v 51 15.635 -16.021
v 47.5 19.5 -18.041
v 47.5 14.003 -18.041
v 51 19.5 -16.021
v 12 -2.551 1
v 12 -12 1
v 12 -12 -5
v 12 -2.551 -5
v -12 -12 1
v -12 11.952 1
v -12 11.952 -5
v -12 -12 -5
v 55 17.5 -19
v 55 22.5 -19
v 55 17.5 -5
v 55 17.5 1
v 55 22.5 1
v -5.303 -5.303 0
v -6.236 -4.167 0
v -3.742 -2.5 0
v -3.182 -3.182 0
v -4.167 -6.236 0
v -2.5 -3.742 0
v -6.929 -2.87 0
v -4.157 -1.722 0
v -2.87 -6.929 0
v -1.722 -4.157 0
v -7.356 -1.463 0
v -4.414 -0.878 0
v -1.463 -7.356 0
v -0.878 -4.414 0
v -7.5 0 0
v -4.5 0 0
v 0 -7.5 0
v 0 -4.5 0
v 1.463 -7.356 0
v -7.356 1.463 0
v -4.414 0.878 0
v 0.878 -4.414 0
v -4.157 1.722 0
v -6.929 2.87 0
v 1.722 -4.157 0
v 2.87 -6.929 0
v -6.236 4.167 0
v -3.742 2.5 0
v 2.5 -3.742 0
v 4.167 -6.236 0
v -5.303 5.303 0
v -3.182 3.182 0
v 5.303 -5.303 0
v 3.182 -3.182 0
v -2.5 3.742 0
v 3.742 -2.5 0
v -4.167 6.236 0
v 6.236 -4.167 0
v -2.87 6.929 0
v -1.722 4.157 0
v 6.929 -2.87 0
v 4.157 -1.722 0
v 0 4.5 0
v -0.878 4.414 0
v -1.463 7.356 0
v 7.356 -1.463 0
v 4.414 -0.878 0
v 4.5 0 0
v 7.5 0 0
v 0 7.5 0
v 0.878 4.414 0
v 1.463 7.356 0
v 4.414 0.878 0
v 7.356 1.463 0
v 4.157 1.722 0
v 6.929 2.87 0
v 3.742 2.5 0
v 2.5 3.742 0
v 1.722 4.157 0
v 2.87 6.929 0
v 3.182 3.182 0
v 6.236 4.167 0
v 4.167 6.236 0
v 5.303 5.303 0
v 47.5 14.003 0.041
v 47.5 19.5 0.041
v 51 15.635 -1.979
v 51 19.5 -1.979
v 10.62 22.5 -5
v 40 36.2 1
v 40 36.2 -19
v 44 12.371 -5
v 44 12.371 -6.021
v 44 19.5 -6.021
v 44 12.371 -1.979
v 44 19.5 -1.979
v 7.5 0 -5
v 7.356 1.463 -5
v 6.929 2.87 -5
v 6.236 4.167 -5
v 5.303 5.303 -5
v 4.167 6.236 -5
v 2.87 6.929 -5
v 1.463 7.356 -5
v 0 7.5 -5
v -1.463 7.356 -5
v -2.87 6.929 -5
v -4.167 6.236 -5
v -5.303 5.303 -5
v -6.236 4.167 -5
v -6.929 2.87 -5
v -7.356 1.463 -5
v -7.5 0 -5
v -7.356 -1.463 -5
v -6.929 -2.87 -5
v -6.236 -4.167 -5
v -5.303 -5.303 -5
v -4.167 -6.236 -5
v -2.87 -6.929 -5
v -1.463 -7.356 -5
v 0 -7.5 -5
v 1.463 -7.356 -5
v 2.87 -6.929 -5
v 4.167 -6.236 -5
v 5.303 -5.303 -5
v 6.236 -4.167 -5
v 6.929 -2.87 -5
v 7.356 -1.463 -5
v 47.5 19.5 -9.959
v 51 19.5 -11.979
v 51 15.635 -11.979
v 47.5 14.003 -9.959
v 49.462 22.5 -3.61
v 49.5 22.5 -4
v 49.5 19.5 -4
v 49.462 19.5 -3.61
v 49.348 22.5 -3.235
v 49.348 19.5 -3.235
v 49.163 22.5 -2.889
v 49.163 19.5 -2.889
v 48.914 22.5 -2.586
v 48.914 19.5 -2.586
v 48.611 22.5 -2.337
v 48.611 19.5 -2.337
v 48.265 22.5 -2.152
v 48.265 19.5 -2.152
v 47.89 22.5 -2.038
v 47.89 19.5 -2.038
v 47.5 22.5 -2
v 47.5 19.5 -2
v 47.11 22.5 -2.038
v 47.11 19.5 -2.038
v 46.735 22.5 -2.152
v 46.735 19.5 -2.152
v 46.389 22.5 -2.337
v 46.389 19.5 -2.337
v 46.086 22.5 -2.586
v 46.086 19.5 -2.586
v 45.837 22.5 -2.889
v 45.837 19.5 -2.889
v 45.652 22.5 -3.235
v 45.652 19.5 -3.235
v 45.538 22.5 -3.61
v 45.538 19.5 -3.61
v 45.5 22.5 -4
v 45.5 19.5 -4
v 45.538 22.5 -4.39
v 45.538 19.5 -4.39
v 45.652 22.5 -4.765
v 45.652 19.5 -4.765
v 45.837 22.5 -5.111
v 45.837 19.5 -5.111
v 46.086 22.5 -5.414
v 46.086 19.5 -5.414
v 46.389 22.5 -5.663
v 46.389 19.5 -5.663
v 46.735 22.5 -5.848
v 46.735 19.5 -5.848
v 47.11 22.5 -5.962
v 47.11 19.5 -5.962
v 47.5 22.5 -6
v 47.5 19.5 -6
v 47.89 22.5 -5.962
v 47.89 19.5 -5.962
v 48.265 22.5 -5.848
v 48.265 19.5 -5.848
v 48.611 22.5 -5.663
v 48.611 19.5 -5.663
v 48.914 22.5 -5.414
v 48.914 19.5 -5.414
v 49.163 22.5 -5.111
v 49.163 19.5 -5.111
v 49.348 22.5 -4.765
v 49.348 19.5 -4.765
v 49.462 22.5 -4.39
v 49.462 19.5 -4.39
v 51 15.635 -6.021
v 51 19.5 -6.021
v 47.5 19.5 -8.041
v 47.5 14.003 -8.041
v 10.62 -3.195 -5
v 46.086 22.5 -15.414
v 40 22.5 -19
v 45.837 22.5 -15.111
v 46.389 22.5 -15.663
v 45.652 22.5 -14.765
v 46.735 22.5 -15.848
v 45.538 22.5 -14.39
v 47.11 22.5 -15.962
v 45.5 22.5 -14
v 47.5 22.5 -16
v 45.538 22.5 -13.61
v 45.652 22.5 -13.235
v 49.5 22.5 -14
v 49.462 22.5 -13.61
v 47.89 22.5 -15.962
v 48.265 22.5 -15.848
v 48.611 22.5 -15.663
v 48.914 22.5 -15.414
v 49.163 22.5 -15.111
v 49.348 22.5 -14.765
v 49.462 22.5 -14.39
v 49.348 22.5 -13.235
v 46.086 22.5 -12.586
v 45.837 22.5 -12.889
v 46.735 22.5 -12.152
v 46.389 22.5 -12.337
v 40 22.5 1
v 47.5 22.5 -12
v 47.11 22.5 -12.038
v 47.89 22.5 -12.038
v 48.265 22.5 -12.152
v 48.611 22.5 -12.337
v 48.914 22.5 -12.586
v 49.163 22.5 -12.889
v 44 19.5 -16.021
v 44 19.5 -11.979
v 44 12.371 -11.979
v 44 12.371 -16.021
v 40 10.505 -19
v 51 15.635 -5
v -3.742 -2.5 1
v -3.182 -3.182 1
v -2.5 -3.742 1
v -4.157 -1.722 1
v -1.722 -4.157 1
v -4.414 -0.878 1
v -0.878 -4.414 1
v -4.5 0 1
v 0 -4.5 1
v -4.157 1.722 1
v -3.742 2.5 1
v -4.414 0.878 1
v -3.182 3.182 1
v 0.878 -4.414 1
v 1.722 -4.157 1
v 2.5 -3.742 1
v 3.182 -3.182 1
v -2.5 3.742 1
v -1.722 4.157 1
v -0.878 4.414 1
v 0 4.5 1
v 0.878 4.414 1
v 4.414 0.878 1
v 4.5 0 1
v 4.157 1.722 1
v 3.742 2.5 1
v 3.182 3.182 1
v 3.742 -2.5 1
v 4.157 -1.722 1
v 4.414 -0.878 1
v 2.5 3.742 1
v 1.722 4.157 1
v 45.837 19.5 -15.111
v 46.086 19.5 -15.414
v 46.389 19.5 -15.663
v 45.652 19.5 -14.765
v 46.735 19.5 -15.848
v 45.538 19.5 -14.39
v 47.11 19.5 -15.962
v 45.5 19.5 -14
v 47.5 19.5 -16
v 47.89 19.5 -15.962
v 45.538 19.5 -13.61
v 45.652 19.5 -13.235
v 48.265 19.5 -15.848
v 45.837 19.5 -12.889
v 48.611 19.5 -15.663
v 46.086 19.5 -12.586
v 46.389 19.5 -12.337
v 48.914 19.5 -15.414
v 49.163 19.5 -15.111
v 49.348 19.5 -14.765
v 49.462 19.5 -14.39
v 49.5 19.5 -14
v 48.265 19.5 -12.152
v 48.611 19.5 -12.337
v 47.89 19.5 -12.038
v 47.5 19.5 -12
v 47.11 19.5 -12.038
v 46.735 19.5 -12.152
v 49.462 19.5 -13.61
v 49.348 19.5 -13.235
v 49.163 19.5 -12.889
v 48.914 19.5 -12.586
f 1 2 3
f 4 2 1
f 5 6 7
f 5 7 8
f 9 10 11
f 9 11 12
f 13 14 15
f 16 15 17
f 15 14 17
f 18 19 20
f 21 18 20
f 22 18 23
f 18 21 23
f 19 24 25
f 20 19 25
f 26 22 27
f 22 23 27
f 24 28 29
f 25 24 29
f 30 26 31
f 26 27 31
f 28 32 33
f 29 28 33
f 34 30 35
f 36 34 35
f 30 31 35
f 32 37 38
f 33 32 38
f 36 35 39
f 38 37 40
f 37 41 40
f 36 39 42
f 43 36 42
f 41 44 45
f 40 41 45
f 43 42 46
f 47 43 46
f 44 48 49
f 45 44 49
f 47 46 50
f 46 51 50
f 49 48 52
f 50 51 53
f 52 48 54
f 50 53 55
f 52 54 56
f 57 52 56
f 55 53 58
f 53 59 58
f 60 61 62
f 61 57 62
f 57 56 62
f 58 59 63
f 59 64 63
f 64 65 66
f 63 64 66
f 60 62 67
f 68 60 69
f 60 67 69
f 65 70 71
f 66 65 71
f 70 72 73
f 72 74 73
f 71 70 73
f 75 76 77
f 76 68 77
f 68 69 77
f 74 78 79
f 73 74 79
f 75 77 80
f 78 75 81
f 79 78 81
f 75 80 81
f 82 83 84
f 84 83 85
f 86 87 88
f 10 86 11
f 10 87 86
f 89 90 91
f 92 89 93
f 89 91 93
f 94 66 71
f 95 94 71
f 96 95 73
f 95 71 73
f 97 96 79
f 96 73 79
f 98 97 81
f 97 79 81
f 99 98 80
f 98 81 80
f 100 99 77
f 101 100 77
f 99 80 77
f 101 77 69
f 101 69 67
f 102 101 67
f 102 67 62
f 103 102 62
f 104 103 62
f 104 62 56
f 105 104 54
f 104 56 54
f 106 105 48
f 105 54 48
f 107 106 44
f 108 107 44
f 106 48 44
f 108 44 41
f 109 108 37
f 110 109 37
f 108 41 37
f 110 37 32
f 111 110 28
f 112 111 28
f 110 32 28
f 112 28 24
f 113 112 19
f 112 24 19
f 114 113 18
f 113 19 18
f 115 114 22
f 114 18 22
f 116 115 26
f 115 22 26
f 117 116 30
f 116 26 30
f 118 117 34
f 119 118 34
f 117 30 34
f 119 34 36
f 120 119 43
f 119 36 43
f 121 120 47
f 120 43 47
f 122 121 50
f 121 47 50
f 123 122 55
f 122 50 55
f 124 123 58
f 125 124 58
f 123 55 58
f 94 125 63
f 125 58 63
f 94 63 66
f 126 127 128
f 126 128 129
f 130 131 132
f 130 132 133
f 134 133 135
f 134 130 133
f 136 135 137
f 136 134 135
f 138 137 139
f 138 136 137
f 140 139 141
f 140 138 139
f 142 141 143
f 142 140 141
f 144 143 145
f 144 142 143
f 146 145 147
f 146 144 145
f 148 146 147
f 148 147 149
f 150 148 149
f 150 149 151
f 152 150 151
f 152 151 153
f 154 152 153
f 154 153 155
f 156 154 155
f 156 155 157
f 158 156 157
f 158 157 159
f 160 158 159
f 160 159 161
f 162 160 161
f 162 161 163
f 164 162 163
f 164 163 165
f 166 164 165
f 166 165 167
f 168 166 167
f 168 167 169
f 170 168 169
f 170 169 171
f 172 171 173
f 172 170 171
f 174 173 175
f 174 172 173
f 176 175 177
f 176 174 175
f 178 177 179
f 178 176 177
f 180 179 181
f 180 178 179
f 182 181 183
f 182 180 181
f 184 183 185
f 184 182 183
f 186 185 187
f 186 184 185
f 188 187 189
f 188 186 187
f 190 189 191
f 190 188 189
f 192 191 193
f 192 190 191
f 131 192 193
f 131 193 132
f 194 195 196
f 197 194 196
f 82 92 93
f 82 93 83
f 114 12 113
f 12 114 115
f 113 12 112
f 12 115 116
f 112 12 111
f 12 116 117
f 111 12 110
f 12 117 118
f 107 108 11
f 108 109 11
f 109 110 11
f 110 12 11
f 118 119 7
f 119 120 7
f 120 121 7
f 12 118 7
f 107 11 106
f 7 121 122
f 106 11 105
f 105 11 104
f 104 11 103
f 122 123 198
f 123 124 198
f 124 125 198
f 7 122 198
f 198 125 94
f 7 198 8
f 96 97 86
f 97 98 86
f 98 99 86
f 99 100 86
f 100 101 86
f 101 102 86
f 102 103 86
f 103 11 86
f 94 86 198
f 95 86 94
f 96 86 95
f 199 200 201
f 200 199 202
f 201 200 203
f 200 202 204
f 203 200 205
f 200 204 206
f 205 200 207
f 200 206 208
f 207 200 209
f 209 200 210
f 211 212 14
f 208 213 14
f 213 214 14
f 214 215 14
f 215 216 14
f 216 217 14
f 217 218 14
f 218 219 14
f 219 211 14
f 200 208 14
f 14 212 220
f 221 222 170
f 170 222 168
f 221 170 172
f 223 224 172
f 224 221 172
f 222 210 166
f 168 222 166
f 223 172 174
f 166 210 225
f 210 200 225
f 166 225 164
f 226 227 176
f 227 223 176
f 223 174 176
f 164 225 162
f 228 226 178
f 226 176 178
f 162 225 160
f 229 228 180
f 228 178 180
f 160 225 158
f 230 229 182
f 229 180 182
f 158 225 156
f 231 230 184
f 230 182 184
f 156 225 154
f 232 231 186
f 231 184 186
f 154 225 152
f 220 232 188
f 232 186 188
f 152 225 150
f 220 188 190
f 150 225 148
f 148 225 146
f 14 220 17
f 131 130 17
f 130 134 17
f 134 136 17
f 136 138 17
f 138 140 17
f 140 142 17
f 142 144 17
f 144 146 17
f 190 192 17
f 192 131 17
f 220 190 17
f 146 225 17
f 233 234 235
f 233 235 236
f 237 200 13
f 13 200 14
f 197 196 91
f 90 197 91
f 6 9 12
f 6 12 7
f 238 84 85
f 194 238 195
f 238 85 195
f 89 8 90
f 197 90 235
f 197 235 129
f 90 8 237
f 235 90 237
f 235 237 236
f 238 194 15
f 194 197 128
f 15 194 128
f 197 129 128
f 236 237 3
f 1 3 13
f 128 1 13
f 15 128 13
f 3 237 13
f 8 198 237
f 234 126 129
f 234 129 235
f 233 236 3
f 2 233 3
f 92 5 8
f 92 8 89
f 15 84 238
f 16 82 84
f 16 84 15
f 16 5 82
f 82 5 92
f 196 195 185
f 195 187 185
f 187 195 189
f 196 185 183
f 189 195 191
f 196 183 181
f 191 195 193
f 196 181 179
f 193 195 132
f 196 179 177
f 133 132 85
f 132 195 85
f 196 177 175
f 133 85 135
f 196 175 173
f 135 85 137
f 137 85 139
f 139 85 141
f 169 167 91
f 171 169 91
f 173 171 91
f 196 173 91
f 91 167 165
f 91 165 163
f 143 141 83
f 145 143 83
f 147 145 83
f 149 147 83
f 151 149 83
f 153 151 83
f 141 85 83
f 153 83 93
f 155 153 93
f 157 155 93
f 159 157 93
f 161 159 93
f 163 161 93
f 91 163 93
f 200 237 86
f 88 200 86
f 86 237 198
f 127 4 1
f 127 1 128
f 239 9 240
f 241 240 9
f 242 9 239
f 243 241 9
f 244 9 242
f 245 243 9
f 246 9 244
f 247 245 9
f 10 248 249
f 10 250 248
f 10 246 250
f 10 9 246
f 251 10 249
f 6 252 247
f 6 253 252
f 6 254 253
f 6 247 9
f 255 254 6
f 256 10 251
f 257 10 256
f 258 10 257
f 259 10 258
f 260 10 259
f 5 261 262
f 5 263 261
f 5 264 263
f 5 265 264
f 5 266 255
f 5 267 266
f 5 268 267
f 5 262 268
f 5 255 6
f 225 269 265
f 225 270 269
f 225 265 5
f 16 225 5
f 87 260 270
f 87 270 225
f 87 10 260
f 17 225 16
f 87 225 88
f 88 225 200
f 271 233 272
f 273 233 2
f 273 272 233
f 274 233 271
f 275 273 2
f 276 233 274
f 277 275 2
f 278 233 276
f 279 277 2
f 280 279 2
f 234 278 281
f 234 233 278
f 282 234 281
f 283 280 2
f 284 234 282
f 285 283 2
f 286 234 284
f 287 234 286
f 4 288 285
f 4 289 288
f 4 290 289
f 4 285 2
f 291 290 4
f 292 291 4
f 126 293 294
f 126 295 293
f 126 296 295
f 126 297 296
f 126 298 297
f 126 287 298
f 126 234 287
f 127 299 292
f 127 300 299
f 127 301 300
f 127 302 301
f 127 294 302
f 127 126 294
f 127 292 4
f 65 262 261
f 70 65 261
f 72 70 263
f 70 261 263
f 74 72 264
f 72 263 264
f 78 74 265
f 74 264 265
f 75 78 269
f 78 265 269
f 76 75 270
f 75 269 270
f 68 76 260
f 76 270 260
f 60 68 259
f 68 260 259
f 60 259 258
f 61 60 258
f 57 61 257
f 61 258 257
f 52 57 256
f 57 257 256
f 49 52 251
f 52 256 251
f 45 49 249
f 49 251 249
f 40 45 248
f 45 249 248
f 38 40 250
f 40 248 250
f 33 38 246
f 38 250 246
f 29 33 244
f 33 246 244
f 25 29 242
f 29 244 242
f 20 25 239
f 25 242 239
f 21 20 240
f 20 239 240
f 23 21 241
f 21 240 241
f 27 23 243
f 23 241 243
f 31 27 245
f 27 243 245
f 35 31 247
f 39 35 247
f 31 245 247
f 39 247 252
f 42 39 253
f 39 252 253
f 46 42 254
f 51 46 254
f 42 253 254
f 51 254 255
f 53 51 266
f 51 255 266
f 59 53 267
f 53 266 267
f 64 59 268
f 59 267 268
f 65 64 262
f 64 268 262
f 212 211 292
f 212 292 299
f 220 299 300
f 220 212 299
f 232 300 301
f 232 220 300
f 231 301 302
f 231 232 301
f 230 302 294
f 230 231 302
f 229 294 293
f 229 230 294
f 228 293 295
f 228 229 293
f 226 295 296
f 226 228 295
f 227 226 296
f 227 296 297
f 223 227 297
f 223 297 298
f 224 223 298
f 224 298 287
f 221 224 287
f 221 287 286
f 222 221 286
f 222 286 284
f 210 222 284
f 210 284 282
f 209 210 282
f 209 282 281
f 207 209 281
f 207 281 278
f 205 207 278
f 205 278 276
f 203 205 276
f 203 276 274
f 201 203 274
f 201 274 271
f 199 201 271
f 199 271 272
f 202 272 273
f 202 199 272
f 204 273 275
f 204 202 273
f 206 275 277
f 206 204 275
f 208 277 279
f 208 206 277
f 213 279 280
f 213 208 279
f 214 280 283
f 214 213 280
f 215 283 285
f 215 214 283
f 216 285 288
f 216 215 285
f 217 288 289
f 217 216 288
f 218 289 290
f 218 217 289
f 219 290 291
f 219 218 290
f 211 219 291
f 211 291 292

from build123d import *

# Parameters (mm, degrees)
SKETCH1_R           = 10
SKETCH1_R_2         = 7.5
BOSS_EXTRUDE1_DEPTH = 5
BOSS_EXTRUDE2_START = 1
SKETCH1_3_R         = 10
SKETCH1_3_R_2       = 7.5
SKETCH1_3_R_3       = 4.5
BOSS_EXTRUDE2_DEPTH = 1
SKETCH2_R           = 10
BOSS_EXTRUDE3_DEPTH = 6
BOSS_EXTRUDE7_REACH = 67.117
SKETCH3_W           = 15
SKETCH3_H           = 14
SKETCH4_R           = 2
CUT_EXTRUDE4_DEPTH  = 68.647985927
CUT_EXTRUDE5_START  = 3
SKETCH4_3_R         = 2
CUT_EXTRUDE5_DEPTH  = 65.647985927
BOSS_EXTRUDE8_REACH = 69.648


with BuildPart() as part:
    # Sketch1 → Boss-Extrude1 (new body)
    with BuildSketch(Plane.XY):
        Circle(SKETCH1_R)
        Circle(SKETCH1_R_2, mode=Mode.SUBTRACT)
    extrude(amount=-BOSS_EXTRUDE1_DEPTH)

    # Sketch1<3> → Boss-Extrude2 (add)
    # profile 1 of 2: a face of its own
    with BuildSketch(Plane.XY.offset(BOSS_EXTRUDE2_START)):
        Circle(SKETCH1_3_R)
        Circle(SKETCH1_3_R_2, mode=Mode.SUBTRACT)
    # profile 2 of 2: a face of its own
    with BuildSketch(Plane.XY.offset(BOSS_EXTRUDE2_START)):
        Circle(SKETCH1_3_R_2)
        Circle(SKETCH1_3_R_3, mode=Mode.SUBTRACT)
    extrude(amount=-BOSS_EXTRUDE2_DEPTH)

    # Sketch2 → Boss-Extrude3 (add)
    with BuildSketch(Plane.XY.offset(1)):
        Polygon((55, 17.5), (55, 22.5), (40, 22.5), (40, 36.2), (-12, 11.952001776), (-12, -12), (12, -12), (12, -2.551229301), align=None)
        Circle(SKETCH2_R, mode=Mode.SUBTRACT)
    extrude(amount=-BOSS_EXTRUDE3_DEPTH)

    # Boss-Extrude7: up to this plane
    boss_extrude7_end = Plane(origin=(3.120451856, -6.691830601, -87.536295046), z_dir=(-0.422618261740692, 0.9063077870366535, 0))
    # Sketch3 → Boss-Extrude7 (add, up to the surface)
    with BuildSketch(Plane.XZ.offset(-22.5), mode=Mode.PRIVATE) as boss_extrude7_sk1:
        Polygon((40, -5), (40, -19), (10.620255189, -5), align=None)
    boss_extrude7_tool1 = split(extrude(boss_extrude7_sk1.sketch, amount=BOSS_EXTRUDE7_REACH, mode=Mode.PRIVATE), bisect_by=boss_extrude7_end, keep=Keep.BOTH, mode=Mode.PRIVATE)
    add(boss_extrude7_tool1.solids().sort_by_distance((30.206752, 22.5, -9.666667))[0])
    # Sketch3 → Boss-Extrude7 (add, up to the surface)
    with BuildSketch(Plane.XZ.offset(-22.5), mode=Mode.PRIVATE) as boss_extrude7_sk2:
        with Locations((47.5, -12)):
            Rectangle(SKETCH3_W, SKETCH3_H)
    boss_extrude7_tool2 = split(extrude(boss_extrude7_sk2.sketch, amount=BOSS_EXTRUDE7_REACH, mode=Mode.PRIVATE), bisect_by=boss_extrude7_end, keep=Keep.BOTH, mode=Mode.PRIVATE)
    add(boss_extrude7_tool2.solids().sort_by_distance((47.5, 22.5, -12))[0])

    # Sketch4 → Cut-Extrude4 (cut, through all)
    with BuildSketch(Plane.XZ.offset(-22.5)):
        with Locations((47.5, -14)):
            Circle(SKETCH4_R)
        with Locations((47.5, -4)):
            Circle(SKETCH4_R)
    extrude(amount=CUT_EXTRUDE4_DEPTH, mode=Mode.SUBTRACT)

    # Sketch4<3> → Cut-Extrude5 (cut, through all)
    # profile 1 of 2: a face of its own
    with BuildSketch(Plane.XZ.offset(-22.5).offset(CUT_EXTRUDE5_START)):
        Polygon((47.5, -8.041451884), (44, -6.020725942), (44, -1.979274058), (47.5, 0.041451884), (51, -1.979274058), (51, -6.020725942), align=None)
        with Locations(Location((47.5, -4, 0), (0, 0, 270))):
            Circle(SKETCH4_3_R, mode=Mode.SUBTRACT)
    # profile 2 of 2: a face of its own
    with BuildSketch(Plane.XZ.offset(-22.5).offset(CUT_EXTRUDE5_START)):
        Polygon((51, -16.020725942), (51, -11.979274058), (47.5, -9.958548116), (44, -11.979274058), (44, -16.020725942), (47.5, -18.041451884), align=None)
        with Locations(Location((47.5, -14, 0), (0, 0, 270))):
            Circle(SKETCH4_3_R, mode=Mode.SUBTRACT)
    extrude(amount=CUT_EXTRUDE5_DEPTH, mode=Mode.SUBTRACT)

    # Boss-Extrude8: up to this face of the body (flat: up to its plane)
    boss_extrude8_end = Plane(part.part.faces().sort_by_distance((14, 24.076000888, -2))[0])
    # Sketch3<4> → Boss-Extrude8 (add, up to the picked face)
    with BuildSketch(Plane.XZ.offset(-22.5), mode=Mode.PRIVATE) as boss_extrude8_sk1:
        Polygon((40, -5), (40, -19), (10.620255189, -5), align=None)
    boss_extrude8_tool1 = split(extrude(boss_extrude8_sk1.sketch, amount=-BOSS_EXTRUDE8_REACH, mode=Mode.PRIVATE), bisect_by=boss_extrude8_end, keep=Keep.BOTH, mode=Mode.PRIVATE)
    add(boss_extrude8_tool1.solids().sort_by(Axis((30.206752, 22.5, -9.666667), (0, 1, 0)))[0])


solid = part.part
